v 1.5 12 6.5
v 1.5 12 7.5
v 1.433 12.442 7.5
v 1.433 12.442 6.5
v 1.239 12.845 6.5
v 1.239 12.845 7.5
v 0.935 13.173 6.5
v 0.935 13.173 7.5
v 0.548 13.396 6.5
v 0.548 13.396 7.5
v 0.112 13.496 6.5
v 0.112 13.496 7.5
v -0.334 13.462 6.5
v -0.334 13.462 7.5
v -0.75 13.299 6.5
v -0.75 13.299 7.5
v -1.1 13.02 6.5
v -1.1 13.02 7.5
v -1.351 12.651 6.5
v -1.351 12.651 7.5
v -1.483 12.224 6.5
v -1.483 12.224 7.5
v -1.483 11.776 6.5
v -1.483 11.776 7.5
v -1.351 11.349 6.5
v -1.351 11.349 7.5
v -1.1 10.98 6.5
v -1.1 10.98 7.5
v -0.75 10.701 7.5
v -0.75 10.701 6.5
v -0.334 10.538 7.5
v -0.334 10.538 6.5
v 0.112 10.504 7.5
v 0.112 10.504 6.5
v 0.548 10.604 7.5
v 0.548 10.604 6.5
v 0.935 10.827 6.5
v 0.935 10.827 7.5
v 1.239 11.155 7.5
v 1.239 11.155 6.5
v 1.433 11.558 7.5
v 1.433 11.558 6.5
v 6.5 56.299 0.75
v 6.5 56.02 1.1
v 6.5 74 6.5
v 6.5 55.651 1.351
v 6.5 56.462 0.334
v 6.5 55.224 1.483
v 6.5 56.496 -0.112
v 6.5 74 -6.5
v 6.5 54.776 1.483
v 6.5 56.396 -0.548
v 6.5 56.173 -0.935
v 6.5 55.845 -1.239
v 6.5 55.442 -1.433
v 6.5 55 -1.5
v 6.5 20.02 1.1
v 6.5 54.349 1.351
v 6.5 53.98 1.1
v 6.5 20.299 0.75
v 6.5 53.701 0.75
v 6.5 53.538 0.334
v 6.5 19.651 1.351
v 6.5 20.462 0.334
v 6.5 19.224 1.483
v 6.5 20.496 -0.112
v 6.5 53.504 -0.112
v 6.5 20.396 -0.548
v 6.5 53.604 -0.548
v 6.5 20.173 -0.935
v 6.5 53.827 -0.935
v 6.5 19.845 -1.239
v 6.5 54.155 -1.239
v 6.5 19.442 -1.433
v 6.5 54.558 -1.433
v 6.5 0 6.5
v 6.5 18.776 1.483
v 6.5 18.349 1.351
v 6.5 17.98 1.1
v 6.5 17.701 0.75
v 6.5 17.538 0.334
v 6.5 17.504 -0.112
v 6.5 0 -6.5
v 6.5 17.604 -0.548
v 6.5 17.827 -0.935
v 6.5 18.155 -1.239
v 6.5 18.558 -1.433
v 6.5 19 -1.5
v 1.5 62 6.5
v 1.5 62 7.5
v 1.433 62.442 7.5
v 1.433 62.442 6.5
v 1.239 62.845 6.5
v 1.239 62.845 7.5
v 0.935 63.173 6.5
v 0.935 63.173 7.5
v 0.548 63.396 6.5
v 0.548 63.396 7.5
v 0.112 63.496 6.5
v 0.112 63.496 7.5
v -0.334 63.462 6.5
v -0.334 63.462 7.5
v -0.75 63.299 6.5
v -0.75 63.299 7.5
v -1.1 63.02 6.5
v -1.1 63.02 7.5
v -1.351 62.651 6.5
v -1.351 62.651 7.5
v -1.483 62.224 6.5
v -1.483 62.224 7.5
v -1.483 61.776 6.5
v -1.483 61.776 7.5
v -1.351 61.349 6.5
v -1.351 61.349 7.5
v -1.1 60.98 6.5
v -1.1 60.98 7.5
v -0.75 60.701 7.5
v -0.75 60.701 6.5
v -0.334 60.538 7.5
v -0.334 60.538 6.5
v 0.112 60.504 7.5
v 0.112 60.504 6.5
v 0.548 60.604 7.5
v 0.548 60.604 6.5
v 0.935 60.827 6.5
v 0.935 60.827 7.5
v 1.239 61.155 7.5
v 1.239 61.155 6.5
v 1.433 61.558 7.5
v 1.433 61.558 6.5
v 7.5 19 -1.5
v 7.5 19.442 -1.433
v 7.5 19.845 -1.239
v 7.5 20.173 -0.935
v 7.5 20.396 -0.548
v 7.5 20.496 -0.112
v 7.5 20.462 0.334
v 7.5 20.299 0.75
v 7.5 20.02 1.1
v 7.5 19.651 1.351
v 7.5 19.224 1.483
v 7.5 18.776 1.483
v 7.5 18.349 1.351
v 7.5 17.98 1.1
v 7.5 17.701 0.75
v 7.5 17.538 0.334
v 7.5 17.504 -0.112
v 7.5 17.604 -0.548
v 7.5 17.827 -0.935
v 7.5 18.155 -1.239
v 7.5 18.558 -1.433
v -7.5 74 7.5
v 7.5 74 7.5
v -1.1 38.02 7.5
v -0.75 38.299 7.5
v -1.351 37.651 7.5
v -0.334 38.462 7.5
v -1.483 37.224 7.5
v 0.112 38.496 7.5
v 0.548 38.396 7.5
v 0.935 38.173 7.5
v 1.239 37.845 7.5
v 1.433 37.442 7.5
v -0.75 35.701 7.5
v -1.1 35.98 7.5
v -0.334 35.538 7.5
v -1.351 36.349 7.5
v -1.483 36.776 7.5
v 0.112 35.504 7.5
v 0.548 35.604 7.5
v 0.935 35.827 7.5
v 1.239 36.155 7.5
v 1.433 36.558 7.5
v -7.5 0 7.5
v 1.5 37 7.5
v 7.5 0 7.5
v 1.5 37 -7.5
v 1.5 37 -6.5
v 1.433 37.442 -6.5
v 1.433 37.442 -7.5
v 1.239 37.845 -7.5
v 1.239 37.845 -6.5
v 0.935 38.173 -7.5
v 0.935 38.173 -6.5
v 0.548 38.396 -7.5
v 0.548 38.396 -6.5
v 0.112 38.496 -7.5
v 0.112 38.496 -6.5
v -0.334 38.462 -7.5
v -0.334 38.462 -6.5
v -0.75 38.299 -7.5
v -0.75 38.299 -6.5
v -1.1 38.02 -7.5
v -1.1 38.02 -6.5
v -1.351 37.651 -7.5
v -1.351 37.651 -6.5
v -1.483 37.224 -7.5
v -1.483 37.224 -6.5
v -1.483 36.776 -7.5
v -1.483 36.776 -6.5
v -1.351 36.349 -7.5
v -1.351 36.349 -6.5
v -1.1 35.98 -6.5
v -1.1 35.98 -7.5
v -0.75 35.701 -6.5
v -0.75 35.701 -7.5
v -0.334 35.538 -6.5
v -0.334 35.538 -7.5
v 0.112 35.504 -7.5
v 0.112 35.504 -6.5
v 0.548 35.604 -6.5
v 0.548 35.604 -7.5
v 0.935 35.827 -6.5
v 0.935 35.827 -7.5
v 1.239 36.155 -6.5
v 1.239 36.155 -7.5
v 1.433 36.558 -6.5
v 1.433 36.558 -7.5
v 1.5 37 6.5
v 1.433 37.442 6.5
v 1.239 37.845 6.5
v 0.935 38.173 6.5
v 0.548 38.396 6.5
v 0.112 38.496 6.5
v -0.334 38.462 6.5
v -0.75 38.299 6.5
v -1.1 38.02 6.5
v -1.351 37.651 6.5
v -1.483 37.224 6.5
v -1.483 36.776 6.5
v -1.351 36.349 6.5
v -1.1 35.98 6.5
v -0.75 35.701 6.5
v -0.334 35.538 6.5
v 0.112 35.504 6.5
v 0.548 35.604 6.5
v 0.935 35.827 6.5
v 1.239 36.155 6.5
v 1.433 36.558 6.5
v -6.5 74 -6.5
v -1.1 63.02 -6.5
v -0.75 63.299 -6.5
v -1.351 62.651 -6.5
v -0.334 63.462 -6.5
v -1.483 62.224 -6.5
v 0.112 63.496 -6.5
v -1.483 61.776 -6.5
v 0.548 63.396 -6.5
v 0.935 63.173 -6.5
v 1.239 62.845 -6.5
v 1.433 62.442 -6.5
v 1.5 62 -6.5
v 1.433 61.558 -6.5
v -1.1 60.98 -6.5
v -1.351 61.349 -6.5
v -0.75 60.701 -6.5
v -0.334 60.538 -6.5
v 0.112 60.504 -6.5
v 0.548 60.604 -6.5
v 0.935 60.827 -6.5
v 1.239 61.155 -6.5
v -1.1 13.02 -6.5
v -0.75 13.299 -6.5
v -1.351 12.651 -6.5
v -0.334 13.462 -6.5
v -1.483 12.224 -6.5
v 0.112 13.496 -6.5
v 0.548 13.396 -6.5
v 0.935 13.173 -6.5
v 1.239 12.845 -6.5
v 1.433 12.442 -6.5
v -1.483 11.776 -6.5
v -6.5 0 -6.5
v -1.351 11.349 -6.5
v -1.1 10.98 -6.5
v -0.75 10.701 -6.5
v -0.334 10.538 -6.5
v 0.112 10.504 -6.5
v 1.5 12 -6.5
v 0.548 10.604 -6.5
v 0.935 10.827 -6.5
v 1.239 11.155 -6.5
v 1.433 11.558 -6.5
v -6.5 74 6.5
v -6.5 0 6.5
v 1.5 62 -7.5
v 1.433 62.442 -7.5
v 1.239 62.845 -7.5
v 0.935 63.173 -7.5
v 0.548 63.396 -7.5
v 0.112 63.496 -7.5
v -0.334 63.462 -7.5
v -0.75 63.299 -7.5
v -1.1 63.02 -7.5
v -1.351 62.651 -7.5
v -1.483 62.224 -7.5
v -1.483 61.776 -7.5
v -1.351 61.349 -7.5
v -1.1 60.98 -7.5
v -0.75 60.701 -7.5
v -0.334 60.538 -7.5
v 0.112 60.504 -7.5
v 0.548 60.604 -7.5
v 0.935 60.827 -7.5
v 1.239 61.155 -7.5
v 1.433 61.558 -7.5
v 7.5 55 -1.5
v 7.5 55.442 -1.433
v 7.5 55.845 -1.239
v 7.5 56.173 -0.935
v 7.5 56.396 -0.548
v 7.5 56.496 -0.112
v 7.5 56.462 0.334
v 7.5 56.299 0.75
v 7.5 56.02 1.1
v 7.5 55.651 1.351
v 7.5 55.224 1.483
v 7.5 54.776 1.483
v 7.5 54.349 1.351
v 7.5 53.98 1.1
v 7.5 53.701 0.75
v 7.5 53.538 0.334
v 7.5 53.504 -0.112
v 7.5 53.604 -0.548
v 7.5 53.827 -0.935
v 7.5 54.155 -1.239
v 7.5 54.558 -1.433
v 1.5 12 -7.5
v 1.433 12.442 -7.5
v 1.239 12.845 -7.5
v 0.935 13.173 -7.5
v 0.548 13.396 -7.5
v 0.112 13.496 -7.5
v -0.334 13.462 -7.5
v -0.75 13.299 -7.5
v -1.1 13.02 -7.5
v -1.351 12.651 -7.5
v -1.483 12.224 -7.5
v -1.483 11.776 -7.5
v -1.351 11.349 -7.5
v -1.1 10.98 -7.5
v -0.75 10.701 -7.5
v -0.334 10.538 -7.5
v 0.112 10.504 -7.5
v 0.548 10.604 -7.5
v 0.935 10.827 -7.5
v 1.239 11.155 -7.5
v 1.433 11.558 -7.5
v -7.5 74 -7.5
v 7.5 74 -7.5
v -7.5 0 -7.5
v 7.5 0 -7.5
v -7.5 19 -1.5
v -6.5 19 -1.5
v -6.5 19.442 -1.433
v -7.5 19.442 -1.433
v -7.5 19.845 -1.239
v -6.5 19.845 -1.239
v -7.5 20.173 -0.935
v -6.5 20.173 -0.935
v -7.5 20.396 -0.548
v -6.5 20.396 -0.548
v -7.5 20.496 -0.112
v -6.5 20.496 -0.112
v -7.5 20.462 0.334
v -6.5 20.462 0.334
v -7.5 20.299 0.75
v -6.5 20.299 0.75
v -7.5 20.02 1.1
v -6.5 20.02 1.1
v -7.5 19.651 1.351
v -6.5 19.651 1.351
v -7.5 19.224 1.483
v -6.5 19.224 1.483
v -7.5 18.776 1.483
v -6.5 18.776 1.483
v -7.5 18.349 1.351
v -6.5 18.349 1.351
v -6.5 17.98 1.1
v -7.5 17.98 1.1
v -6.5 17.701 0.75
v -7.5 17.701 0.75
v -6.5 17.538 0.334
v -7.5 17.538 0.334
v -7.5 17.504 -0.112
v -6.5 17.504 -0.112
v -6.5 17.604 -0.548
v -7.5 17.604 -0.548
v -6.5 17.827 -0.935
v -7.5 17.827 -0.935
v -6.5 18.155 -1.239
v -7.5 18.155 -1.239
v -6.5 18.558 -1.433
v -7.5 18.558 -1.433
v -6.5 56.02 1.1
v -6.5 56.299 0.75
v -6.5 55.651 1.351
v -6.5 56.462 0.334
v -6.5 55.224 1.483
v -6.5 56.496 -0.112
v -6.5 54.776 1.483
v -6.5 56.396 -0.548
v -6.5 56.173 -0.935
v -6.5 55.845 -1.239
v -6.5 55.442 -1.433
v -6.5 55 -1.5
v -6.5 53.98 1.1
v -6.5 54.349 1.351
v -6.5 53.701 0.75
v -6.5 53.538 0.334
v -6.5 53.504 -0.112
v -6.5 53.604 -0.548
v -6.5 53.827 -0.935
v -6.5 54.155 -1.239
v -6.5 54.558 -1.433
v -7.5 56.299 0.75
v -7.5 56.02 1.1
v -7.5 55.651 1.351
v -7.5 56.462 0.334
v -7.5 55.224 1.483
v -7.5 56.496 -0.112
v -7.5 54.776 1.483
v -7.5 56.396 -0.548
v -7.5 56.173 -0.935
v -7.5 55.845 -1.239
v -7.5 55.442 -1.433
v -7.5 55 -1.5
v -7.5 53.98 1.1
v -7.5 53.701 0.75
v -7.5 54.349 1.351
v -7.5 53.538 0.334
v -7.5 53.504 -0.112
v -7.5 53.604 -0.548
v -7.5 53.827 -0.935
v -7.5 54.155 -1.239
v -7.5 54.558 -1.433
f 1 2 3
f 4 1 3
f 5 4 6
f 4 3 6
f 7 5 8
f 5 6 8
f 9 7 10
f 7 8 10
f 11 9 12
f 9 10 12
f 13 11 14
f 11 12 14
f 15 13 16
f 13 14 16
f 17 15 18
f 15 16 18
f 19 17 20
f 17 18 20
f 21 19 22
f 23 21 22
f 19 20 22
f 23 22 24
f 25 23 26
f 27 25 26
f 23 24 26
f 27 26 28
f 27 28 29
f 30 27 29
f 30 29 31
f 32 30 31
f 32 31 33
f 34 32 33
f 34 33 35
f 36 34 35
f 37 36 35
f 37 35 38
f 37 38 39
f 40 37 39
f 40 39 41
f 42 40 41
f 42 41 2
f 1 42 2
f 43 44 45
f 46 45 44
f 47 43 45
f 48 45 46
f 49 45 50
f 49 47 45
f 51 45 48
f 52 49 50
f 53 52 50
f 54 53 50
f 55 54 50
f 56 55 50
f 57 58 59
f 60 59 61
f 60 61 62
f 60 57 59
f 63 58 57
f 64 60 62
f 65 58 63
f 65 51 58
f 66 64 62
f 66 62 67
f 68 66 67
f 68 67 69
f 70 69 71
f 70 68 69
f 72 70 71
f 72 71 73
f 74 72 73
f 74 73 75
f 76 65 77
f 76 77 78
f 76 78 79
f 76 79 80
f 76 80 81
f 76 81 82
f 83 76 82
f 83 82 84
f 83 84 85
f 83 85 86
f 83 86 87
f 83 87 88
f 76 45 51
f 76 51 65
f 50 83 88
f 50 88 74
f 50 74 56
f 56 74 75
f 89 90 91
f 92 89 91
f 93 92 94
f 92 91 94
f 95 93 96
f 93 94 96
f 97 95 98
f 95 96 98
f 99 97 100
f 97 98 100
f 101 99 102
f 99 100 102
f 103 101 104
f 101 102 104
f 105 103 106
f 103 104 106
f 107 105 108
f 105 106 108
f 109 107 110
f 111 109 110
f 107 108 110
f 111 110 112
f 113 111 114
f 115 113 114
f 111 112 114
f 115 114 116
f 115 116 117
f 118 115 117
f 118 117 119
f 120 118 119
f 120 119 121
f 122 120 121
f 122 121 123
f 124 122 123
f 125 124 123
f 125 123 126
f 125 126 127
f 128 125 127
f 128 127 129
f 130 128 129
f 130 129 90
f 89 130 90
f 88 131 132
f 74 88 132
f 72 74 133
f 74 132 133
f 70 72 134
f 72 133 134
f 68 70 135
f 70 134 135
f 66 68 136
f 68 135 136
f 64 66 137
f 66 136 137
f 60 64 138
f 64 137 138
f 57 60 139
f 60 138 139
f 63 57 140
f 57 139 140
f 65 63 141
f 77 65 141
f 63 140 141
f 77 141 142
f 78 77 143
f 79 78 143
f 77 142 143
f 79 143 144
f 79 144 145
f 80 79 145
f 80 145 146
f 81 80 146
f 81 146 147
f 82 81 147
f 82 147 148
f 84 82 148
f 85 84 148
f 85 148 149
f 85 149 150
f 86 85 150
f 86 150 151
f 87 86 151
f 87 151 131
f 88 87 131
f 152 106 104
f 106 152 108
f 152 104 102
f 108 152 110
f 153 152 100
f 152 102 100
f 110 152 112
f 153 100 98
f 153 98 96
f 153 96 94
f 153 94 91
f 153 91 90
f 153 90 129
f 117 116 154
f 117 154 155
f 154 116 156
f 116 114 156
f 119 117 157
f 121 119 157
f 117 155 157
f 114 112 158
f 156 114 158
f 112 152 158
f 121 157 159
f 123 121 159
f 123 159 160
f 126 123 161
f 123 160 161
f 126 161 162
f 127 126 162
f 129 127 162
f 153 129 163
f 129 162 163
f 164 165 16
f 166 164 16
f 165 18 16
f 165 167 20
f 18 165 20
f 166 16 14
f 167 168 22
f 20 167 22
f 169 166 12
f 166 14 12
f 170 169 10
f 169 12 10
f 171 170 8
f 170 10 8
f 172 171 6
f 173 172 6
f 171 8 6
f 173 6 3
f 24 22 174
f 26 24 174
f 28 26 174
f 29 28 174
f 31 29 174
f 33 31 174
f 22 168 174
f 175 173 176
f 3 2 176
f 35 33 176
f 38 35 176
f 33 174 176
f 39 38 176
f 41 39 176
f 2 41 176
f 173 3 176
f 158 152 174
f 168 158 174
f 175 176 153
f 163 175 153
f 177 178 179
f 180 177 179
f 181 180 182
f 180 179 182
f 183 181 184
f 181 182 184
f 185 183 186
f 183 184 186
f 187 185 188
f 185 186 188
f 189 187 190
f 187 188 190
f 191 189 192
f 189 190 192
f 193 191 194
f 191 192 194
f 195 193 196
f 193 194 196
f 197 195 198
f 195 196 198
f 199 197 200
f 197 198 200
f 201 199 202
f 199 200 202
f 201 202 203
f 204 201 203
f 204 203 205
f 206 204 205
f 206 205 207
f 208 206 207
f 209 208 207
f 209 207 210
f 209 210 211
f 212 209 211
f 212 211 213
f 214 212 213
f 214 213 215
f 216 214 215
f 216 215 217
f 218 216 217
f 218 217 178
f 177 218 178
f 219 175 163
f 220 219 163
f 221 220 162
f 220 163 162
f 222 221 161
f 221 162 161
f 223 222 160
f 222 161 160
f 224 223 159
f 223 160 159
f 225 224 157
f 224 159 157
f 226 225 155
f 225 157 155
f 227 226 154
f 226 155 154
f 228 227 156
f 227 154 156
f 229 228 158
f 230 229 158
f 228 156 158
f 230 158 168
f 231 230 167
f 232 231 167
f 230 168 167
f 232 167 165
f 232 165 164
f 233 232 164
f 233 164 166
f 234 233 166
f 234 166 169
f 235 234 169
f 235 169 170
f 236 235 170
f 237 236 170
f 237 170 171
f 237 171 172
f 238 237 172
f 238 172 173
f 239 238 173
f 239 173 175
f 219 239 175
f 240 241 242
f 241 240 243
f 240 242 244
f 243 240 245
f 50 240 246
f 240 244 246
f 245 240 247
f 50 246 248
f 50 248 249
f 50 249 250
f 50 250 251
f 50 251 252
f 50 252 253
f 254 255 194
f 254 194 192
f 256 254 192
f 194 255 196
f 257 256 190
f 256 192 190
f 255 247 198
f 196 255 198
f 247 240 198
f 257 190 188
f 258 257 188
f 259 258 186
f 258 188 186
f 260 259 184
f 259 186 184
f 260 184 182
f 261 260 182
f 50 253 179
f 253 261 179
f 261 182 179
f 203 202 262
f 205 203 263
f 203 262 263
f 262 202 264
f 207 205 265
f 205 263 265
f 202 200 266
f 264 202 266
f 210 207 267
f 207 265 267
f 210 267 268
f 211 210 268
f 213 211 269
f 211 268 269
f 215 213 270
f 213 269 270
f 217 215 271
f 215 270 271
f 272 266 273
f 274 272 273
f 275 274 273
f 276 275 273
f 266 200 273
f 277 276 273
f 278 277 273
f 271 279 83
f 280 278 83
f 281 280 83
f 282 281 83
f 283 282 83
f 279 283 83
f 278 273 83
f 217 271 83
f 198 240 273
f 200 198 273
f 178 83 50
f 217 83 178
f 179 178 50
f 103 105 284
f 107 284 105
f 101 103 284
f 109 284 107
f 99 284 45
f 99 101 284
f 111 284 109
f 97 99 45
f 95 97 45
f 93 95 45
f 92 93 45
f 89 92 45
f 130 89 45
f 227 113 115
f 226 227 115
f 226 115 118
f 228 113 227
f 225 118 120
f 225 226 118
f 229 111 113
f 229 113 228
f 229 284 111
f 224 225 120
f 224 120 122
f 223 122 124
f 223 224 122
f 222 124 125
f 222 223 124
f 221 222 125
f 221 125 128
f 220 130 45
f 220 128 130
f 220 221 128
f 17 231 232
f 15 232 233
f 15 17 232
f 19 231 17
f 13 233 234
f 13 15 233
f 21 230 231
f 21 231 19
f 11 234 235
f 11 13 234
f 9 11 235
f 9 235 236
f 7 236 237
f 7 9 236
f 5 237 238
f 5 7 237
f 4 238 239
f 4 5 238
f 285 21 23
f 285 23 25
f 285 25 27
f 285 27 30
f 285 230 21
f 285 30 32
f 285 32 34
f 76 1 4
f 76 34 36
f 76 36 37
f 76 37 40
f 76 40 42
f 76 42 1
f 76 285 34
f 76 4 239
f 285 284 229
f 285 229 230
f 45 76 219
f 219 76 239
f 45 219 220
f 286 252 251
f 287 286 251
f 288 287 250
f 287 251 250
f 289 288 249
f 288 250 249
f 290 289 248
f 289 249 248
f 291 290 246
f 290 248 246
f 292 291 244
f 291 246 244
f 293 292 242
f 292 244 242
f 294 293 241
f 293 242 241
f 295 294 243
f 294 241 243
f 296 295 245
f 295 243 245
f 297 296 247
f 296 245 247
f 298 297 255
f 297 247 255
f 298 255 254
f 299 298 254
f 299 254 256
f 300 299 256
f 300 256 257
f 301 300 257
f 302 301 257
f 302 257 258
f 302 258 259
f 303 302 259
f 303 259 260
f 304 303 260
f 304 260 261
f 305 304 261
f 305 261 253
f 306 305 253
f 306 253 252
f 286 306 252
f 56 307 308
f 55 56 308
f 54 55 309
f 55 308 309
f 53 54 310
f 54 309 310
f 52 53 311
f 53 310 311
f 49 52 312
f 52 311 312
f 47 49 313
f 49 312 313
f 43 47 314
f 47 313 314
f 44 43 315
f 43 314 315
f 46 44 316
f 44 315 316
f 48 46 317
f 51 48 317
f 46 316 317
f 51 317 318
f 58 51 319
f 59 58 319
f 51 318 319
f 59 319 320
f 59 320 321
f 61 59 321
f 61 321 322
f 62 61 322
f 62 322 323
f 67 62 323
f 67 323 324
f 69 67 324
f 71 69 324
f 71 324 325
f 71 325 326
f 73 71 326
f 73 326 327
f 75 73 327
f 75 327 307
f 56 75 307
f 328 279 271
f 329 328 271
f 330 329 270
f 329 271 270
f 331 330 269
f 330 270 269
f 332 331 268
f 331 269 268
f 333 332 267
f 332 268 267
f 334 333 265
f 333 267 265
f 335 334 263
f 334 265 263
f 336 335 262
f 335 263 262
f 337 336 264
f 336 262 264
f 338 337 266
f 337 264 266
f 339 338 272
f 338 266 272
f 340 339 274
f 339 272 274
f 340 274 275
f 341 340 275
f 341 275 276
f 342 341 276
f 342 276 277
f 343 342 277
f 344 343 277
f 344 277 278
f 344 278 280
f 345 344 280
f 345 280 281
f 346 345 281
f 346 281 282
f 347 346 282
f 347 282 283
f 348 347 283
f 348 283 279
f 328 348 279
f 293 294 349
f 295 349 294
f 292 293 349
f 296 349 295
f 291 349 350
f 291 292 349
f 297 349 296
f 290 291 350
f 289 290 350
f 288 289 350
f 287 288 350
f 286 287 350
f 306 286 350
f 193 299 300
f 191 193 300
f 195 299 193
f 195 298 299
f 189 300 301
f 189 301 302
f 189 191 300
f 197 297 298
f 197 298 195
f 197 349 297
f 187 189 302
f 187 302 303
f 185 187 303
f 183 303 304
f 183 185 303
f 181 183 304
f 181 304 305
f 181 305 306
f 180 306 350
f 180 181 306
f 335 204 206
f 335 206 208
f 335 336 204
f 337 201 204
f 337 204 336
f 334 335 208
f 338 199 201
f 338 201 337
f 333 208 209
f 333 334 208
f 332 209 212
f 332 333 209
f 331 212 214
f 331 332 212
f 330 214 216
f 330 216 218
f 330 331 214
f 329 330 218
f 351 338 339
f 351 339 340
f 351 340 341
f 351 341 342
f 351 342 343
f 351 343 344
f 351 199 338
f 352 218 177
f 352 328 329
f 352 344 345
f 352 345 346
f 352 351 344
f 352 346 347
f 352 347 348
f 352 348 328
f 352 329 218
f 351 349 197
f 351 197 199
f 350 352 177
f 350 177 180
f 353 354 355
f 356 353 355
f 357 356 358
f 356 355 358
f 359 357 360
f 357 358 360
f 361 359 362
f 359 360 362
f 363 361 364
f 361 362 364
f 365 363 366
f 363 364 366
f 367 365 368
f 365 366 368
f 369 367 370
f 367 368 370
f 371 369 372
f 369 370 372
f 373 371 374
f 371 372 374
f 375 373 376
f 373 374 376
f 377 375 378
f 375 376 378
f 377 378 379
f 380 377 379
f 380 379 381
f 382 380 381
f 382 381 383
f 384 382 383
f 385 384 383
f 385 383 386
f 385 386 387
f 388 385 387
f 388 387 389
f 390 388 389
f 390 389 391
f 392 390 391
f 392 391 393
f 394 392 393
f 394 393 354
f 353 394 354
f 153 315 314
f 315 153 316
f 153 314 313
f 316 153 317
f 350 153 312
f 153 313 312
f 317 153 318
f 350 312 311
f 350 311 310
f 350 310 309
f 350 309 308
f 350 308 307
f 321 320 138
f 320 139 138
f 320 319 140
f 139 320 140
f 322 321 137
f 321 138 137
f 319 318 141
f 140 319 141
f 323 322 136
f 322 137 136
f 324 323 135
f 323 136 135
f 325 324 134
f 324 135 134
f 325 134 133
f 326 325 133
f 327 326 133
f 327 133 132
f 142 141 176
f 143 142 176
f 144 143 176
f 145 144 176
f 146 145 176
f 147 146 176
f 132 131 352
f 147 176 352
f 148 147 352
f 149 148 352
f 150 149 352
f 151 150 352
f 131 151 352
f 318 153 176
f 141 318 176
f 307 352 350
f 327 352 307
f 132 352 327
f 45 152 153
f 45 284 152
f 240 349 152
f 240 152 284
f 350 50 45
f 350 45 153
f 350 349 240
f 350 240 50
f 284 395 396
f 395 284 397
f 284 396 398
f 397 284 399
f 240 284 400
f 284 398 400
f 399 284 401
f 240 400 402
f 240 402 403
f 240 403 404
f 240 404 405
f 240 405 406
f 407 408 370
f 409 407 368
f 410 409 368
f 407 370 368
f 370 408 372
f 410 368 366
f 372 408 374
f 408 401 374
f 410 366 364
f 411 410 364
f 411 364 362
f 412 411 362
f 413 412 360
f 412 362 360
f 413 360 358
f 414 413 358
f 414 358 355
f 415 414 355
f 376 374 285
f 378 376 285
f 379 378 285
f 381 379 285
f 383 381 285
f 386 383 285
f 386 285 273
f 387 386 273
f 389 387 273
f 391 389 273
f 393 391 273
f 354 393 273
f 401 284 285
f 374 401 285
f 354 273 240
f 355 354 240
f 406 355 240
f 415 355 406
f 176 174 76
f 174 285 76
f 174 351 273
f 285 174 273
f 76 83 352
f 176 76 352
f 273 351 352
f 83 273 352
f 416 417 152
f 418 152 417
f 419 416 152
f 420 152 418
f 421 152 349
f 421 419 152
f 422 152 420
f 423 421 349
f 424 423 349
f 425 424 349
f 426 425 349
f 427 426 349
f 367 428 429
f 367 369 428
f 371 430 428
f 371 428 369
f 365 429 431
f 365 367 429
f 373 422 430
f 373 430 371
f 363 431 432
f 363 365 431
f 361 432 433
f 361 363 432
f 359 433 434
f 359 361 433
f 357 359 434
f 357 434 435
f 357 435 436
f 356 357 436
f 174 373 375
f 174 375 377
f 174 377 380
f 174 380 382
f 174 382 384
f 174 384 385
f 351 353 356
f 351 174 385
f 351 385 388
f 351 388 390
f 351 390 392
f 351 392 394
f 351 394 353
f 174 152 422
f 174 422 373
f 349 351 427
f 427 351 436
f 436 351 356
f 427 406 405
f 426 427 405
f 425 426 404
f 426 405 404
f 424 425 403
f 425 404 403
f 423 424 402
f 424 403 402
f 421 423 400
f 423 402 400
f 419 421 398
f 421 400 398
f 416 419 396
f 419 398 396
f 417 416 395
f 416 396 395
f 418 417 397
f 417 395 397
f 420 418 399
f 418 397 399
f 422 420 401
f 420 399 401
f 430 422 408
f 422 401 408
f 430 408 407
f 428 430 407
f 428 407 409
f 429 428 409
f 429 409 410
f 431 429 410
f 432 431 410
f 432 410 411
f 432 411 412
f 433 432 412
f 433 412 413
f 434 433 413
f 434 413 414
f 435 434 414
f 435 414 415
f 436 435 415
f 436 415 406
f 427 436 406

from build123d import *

# Parameters (mm, degrees)
SKETCH_1_W          = 15
SKETCH_1_H          = 15
SKETCH_1_W_2        = 13
SKETCH_1_H_2        = 13
EXTRUDE_1_DEPTH     = 74
SKETCH_2_R          = 1.5
CUT_EXTRUDE_1_DEPTH = 76.876544465
SKETCH_3_R          = 1.5
CUT_EXTRUDE_2_DEPTH = 76.876544465


with BuildPart() as part:
    # 草图1 → 凸台-拉伸1 (new body)
    with BuildSketch(Plane(origin=(0, 0, 0), x_dir=(1, 0, 0), z_dir=(0, 1, 0))):
        Rectangle(SKETCH_1_W, SKETCH_1_H)
        Rectangle(SKETCH_1_W_2, SKETCH_1_H_2, mode=Mode.SUBTRACT)
    extrude(amount=EXTRUDE_1_DEPTH)

    # 草图2 → 切除-拉伸1 (cut, through all)
    with BuildSketch(Plane.XY.offset(7.5)):
        with Locations((0, 62)):
            Circle(SKETCH_2_R)
        with Locations((0, 37)):
            Circle(SKETCH_2_R)
        with Locations((0, 12)):
            Circle(SKETCH_2_R)
    extrude(amount=-CUT_EXTRUDE_1_DEPTH, mode=Mode.SUBTRACT)

    # 草图3 → 切除-拉伸2 (cut, through all)
    with BuildSketch(Plane(origin=(7.5, 0, 0), x_dir=(0, 0, -1), z_dir=(1, 0, 0))):
        with Locations((0, 55)):
            Circle(SKETCH_3_R)
        with Locations((0, 19)):
            Circle(SKETCH_3_R)
    extrude(amount=-CUT_EXTRUDE_2_DEPTH, mode=Mode.SUBTRACT)


solid = part.part
